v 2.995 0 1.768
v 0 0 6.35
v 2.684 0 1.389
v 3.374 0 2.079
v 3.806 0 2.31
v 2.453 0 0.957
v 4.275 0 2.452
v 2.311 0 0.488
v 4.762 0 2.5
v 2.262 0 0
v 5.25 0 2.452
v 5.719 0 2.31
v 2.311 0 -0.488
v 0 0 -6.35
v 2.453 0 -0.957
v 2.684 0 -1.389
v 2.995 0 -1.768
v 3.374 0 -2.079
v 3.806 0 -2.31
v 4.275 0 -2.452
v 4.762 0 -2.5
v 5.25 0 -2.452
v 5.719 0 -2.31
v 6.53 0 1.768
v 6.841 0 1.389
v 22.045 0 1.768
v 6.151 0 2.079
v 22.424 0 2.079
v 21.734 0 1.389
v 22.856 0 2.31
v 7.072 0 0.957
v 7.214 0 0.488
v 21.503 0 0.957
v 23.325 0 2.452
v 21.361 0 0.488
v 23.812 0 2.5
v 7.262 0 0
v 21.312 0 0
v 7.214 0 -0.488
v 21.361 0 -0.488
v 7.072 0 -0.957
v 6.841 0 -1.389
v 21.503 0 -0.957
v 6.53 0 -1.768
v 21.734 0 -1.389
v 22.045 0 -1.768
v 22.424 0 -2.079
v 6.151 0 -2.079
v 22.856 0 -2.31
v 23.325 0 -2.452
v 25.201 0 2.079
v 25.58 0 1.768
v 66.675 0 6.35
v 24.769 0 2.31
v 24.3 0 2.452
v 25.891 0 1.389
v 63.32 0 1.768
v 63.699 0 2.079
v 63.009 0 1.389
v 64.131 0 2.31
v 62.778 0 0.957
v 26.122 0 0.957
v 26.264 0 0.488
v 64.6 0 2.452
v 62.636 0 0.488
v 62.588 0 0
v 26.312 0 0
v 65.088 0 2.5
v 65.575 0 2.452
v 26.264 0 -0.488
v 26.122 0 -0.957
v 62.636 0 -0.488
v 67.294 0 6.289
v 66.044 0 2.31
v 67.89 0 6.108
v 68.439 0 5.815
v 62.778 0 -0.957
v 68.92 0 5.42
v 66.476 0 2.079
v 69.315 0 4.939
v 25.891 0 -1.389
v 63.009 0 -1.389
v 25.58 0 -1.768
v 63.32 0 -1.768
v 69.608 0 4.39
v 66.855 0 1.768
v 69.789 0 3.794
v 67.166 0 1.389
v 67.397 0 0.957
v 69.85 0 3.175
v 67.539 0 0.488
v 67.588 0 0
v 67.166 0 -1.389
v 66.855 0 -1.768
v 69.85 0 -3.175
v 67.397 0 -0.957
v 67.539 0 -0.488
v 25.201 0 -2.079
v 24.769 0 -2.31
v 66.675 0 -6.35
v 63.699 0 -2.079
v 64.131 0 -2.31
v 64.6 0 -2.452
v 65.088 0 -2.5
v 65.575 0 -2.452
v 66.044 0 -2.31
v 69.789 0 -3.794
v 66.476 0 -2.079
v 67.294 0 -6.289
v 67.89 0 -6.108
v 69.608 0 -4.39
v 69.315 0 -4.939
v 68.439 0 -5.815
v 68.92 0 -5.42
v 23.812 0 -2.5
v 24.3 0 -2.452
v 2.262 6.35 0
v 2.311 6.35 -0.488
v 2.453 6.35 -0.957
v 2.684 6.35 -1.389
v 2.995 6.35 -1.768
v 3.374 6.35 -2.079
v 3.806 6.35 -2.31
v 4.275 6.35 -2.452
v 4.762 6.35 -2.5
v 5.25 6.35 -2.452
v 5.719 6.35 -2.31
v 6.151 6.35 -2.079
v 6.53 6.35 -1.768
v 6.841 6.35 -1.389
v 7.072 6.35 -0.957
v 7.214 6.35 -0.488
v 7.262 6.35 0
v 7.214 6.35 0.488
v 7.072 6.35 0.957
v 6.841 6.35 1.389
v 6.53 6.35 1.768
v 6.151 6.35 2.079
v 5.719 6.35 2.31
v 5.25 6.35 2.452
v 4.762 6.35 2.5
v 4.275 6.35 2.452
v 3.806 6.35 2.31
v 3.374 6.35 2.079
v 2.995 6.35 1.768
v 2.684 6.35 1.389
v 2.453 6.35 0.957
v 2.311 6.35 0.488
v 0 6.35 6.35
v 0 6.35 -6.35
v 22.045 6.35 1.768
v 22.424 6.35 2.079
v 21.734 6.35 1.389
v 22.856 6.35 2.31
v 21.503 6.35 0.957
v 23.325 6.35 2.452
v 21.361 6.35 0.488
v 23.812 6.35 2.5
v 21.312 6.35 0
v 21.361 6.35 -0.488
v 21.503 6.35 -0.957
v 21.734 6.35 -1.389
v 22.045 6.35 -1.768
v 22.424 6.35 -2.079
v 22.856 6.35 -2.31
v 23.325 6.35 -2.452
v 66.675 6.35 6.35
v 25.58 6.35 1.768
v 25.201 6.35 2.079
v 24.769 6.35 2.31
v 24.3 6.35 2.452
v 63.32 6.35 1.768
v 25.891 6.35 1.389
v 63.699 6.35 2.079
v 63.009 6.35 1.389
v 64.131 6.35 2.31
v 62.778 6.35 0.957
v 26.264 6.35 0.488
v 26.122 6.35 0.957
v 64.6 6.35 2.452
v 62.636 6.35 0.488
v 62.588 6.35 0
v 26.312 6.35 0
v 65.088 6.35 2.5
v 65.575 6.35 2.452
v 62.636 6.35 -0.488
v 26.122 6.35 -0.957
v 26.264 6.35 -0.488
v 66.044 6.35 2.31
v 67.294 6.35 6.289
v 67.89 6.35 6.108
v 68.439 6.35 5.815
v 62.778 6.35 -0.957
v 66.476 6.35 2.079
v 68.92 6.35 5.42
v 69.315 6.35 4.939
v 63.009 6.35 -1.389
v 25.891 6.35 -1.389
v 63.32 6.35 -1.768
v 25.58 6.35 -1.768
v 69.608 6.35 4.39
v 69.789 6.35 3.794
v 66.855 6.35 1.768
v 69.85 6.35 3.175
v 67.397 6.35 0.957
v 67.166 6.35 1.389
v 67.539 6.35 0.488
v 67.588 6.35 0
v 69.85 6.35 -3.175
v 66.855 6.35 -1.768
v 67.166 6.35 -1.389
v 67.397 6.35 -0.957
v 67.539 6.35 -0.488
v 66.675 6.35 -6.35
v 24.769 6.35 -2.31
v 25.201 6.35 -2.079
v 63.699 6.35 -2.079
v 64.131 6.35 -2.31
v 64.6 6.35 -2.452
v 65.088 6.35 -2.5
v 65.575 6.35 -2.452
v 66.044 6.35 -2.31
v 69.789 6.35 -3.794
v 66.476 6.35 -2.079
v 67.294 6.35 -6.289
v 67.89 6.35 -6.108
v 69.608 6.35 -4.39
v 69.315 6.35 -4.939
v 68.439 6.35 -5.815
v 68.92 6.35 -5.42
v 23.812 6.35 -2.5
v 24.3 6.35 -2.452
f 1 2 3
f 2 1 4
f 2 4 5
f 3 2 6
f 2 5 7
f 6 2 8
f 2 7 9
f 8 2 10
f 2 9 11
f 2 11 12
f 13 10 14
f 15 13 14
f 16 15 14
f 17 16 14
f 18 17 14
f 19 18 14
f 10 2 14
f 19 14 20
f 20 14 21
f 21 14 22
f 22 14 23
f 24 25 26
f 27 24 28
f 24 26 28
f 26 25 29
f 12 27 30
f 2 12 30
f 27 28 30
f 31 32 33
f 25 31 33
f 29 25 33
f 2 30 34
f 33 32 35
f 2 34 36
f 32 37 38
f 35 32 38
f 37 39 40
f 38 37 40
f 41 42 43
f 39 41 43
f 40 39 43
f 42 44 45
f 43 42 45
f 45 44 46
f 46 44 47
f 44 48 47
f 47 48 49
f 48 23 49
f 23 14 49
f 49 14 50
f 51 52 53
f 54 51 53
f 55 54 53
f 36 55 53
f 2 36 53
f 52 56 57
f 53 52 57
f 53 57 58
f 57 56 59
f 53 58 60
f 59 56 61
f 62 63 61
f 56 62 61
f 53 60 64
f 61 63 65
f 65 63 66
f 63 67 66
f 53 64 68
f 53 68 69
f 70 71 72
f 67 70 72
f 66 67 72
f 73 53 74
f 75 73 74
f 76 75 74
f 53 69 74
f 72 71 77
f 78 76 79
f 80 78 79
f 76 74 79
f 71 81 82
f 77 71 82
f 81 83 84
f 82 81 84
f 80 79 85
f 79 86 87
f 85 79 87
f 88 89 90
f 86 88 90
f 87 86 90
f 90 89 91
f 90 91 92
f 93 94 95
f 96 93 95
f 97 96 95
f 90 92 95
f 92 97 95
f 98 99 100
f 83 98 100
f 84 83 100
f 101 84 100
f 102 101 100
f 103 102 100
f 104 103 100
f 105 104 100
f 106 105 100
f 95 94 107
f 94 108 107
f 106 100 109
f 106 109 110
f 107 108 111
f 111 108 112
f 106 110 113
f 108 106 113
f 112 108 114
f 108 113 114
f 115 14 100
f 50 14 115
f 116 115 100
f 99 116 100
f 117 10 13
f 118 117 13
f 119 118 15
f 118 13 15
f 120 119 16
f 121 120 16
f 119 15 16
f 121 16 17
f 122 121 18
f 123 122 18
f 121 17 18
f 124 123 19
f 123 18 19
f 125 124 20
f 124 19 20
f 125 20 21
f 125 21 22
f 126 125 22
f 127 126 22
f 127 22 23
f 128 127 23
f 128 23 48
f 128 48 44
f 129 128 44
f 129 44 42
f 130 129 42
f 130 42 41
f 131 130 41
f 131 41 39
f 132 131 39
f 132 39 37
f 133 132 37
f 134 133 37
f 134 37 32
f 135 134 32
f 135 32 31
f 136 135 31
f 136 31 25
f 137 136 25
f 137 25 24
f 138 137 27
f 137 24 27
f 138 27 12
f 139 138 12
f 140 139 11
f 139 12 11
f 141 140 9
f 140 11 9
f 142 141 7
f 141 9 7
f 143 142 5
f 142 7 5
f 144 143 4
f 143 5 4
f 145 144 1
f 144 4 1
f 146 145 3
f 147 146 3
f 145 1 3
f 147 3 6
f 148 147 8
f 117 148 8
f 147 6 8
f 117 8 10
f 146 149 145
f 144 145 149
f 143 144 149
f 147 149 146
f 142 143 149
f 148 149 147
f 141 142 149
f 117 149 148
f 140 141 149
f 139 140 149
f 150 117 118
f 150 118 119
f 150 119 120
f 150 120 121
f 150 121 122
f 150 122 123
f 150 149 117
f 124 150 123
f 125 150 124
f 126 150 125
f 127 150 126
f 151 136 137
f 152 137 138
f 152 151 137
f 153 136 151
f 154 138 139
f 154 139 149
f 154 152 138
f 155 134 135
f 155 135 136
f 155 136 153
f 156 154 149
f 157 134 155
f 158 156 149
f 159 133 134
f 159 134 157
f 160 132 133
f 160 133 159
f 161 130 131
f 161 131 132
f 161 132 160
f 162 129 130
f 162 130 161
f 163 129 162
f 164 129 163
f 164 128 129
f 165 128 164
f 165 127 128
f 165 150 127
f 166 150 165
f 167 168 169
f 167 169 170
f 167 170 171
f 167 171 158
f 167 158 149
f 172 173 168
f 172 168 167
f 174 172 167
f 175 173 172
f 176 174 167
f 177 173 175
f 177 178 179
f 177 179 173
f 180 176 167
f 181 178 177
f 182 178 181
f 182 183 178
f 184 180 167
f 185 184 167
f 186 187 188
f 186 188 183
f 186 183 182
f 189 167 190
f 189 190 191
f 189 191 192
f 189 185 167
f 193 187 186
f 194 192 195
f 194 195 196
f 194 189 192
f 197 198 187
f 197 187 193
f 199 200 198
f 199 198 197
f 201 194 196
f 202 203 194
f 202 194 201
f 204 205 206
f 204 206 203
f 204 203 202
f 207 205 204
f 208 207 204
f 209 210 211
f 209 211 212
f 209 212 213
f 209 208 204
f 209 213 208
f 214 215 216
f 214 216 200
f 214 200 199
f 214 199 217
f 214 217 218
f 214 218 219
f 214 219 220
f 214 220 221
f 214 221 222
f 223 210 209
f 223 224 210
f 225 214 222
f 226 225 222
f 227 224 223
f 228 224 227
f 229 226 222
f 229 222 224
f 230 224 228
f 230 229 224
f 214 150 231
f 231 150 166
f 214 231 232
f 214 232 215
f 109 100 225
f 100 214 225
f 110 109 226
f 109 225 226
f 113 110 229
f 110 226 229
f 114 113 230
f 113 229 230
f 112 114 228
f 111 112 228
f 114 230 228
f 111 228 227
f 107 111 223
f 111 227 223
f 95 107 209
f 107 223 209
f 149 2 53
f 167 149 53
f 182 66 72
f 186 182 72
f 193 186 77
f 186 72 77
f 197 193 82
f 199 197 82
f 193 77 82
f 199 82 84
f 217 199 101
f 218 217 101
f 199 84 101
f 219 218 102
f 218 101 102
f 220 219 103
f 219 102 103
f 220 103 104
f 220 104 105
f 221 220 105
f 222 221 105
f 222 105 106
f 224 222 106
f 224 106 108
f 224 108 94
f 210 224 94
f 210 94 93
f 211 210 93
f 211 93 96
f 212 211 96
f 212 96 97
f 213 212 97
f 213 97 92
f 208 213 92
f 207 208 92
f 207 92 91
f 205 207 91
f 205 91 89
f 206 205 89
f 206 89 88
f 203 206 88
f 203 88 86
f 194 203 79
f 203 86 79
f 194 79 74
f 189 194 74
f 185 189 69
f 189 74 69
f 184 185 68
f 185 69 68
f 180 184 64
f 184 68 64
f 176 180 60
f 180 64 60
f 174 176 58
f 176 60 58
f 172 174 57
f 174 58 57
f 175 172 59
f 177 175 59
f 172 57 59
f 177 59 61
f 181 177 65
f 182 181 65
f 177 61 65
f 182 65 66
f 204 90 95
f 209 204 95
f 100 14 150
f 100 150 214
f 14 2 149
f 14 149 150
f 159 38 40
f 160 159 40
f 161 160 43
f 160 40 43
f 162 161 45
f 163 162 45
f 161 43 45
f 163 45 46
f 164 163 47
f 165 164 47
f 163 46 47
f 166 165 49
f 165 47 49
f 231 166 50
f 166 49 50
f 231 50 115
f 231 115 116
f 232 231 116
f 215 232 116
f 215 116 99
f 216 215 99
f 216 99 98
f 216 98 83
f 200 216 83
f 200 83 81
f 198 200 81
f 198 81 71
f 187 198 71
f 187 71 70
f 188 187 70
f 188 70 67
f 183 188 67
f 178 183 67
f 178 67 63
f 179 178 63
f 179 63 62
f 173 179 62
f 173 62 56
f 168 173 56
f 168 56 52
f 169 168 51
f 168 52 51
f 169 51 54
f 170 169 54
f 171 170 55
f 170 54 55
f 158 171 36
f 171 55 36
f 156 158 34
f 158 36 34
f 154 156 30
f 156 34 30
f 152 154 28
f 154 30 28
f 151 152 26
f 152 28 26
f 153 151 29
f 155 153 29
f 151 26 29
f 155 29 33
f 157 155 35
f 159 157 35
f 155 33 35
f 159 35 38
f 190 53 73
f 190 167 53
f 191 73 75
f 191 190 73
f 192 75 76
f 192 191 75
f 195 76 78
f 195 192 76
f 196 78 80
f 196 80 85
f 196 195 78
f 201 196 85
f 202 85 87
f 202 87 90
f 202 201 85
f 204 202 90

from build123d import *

# Parameters (mm, degrees)
SKETCH1_W             = 69.85
SKETCH1_H             = 12.7
BOSS_EXTRUDE1_DEPTH   = 6.35
M6X1_0_TAPPED_HOLE1_D = 5
FILLET1_R             = 3.175


with BuildPart() as part:
    # Sketch1 → Boss-Extrude1 (new body)
    with BuildSketch(Plane(origin=(0, 0, 0), x_dir=(1, 0, 0), z_dir=(0, 1, 0))):
        with Locations((34.925, 0)):
            Rectangle(SKETCH1_W, SKETCH1_H)
    extrude(amount=BOSS_EXTRUDE1_DEPTH)

    # M6x1.0 Tapped Hole1 (through all)
    with Locations(Plane(origin=(0, 6.35, 0), x_dir=(1, 0, 0), z_dir=(0, 1, 0))):
        with Locations((4.7625, 0), (23.8125, 0), (65.0875, 0)):
            Hole(M6X1_0_TAPPED_HOLE1_D / 2)

    # Fillet1
    fillet1_edges = [part.edges().sort_by_distance(p)[0] for p in [
        (69.85, 3.175, -6.35),
        (69.85, 3.175, 6.35),
    ]]
    fillet(fillet1_edges, radius=FILLET1_R)


solid = part.part
